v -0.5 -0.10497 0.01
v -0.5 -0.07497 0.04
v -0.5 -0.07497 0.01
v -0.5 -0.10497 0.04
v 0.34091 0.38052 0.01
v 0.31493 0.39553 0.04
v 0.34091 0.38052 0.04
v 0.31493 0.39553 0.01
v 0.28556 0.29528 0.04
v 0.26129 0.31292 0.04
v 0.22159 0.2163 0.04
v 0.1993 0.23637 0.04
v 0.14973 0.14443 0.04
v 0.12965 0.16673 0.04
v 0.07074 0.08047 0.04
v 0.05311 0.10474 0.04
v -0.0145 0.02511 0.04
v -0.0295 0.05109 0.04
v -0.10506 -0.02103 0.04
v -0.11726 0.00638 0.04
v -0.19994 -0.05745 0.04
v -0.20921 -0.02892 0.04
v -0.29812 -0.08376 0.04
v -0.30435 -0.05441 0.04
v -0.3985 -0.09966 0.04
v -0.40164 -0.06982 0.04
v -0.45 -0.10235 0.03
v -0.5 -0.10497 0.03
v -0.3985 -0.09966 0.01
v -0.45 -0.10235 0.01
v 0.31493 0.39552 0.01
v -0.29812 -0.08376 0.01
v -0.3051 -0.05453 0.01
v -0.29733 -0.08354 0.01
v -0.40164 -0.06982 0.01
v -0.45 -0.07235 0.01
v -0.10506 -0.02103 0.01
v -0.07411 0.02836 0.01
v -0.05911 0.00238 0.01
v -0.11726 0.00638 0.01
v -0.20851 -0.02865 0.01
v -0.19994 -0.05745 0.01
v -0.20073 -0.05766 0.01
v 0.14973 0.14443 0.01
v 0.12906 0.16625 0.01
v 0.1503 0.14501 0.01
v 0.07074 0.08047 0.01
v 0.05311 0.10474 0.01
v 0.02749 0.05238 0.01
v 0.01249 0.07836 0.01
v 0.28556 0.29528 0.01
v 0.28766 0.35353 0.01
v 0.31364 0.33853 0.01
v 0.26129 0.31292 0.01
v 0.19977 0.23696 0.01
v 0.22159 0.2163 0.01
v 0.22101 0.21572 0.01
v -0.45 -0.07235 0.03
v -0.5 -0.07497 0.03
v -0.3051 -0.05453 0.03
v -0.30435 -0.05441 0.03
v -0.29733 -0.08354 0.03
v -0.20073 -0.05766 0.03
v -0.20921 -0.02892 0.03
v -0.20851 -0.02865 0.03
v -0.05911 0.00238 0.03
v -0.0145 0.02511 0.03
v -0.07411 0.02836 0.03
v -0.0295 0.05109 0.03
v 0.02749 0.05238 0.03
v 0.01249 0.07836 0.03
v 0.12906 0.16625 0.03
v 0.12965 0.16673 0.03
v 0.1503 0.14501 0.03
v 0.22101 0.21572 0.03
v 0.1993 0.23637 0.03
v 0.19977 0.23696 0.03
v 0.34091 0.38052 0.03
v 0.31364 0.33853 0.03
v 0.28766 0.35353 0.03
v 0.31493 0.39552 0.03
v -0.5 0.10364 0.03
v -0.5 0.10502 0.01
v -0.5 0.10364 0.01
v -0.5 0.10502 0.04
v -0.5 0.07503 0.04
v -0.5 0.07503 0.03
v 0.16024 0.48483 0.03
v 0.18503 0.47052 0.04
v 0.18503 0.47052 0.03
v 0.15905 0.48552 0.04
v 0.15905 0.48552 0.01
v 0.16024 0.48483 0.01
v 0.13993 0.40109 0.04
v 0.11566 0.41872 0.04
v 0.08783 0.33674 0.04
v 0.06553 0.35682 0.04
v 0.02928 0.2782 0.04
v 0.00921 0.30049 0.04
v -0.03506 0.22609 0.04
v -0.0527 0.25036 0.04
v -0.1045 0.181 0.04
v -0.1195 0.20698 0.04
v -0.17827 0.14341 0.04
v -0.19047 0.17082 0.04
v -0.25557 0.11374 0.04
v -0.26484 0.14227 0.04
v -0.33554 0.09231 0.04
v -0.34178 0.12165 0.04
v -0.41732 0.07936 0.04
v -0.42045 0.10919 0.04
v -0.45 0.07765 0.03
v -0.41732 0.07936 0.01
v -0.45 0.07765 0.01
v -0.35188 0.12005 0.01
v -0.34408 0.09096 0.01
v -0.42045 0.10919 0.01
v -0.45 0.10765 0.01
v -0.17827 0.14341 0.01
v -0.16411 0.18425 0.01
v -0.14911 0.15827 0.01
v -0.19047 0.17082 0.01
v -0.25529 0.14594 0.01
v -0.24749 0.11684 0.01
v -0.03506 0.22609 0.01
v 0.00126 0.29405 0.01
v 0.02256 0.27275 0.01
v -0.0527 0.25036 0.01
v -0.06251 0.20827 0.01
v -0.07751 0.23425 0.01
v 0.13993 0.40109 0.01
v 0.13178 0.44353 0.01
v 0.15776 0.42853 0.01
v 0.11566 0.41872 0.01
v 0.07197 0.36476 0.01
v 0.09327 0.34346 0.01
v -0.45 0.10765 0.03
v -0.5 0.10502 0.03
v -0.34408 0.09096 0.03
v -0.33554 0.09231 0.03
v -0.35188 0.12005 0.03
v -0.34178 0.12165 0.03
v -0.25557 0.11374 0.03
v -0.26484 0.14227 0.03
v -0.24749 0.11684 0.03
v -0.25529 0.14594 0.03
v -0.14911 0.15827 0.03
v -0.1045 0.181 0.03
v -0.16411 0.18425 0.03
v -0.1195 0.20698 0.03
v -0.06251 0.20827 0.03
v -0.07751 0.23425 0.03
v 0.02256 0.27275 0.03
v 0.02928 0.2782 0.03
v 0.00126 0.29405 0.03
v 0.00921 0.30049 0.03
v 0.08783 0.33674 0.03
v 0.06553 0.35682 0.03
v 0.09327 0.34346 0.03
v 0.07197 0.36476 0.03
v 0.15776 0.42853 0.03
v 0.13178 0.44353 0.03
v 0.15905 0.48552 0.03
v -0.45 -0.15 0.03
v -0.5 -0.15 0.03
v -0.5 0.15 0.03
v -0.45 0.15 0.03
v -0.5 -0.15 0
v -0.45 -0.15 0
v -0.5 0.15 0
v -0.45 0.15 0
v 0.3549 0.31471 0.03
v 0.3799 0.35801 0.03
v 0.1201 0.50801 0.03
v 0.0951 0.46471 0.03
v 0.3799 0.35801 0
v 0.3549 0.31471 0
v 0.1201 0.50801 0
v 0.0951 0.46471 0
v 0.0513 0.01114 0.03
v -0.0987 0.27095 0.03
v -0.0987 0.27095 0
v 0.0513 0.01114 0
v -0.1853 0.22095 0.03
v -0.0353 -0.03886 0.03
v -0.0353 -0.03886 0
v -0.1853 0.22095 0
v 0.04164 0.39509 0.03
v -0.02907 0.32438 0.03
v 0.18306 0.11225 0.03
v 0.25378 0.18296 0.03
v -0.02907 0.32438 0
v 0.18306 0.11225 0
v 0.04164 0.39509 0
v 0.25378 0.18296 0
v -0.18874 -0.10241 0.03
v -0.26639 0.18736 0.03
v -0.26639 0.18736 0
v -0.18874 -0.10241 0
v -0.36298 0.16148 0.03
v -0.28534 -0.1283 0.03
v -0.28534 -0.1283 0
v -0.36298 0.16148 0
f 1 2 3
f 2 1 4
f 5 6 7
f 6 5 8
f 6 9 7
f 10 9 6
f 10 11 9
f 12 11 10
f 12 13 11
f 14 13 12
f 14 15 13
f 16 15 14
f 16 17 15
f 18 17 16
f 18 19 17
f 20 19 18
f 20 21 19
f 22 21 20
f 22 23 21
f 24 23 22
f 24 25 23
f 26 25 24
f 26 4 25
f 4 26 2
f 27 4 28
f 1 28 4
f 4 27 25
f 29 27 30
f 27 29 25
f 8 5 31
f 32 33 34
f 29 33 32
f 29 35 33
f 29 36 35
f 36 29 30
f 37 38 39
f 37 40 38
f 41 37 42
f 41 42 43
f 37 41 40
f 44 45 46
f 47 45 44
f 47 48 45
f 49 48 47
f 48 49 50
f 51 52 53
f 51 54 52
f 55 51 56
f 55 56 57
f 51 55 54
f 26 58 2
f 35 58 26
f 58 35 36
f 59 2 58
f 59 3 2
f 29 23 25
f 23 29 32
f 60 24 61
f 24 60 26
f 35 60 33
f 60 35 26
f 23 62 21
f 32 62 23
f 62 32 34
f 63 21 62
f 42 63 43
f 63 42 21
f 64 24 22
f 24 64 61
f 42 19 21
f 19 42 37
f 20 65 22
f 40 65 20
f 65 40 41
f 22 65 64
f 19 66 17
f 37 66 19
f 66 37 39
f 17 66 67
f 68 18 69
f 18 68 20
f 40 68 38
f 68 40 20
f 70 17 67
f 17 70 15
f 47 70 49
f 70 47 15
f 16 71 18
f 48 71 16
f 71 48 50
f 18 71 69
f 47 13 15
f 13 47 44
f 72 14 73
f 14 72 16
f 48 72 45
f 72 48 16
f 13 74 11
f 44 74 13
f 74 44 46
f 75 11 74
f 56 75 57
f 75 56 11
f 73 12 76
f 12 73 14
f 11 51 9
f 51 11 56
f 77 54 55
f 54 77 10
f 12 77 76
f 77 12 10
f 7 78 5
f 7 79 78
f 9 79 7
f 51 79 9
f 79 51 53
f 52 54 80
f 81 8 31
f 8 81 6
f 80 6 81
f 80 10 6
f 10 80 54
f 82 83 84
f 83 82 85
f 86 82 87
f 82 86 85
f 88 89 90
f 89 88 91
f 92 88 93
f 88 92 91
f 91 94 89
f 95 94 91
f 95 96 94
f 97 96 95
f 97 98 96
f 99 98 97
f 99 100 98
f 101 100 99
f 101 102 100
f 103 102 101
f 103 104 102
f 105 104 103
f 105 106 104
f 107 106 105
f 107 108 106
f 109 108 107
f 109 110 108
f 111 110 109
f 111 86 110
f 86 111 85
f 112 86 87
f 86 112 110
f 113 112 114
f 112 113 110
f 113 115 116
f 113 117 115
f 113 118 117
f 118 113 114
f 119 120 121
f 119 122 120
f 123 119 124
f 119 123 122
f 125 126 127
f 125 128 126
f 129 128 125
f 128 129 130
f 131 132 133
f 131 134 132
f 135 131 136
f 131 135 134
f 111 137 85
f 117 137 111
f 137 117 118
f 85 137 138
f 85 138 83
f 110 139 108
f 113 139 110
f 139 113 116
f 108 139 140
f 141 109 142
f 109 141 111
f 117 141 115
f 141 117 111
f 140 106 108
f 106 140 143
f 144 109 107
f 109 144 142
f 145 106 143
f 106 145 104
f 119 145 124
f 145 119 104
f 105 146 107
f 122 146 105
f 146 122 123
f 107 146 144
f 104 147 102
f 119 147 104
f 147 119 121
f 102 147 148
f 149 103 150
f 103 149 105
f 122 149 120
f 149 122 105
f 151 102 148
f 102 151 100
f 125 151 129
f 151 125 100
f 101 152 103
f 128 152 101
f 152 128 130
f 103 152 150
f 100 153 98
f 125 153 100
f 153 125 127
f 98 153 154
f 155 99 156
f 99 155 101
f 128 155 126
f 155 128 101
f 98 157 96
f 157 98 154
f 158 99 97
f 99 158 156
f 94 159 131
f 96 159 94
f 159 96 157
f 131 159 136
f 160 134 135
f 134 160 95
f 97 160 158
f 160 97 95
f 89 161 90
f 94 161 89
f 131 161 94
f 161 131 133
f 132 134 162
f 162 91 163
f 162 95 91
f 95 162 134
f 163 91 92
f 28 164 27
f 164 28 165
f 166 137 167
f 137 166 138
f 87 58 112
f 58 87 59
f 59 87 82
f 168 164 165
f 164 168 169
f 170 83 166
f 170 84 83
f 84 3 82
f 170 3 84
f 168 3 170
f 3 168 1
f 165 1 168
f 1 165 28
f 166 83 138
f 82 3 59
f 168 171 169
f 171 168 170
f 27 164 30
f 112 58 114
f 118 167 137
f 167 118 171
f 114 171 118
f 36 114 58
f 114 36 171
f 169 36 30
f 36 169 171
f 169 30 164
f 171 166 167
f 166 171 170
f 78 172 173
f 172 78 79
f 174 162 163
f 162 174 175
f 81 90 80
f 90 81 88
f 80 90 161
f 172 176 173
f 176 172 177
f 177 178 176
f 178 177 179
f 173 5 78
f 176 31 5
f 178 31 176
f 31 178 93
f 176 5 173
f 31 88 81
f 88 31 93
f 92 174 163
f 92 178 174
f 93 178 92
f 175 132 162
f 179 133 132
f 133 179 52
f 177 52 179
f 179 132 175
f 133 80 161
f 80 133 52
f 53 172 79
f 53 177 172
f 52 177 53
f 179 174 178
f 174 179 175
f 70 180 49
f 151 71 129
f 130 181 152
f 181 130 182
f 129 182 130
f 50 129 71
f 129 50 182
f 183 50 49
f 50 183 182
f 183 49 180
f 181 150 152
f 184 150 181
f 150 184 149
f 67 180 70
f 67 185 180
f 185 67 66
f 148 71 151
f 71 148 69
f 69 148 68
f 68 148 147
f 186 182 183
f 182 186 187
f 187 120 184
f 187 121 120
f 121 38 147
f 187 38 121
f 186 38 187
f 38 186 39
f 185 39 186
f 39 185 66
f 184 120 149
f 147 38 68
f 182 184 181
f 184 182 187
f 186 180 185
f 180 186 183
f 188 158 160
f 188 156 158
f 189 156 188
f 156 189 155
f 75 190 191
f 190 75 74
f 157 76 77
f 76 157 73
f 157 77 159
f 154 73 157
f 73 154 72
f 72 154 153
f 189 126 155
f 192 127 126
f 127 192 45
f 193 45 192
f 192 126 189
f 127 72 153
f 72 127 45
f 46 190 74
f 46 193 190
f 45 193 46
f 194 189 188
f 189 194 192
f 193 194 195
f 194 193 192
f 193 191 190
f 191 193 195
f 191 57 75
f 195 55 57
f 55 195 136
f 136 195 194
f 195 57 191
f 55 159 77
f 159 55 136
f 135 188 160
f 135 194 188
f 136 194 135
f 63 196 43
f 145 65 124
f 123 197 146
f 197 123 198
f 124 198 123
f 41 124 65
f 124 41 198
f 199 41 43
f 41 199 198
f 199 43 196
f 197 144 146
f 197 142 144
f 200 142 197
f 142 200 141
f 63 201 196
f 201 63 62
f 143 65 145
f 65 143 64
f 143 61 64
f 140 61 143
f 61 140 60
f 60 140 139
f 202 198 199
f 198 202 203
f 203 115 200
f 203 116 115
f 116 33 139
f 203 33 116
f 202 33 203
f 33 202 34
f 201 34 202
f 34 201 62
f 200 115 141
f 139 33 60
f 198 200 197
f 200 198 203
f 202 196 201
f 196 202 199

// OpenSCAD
// mirror([0, 0, 1]) import("grass.stl");

//////////////
// STRAIGHT //
//////////////

// // tracks
// translate([ .09, 0, .025]) cube([.03, 1, .03], true);
// translate([-.09, 0, .025]) cube([.03, 1, .03], true);

// // ends
// translate([0, .475, .015]) cube([.3, .05, .03], true);
// translate([0,-.475, .015]) cube([.3, .05, .03], true);

// // beats
// translate([0, .25, .015]) cube([.3, .1, .03], true);
// translate([0,-.25, .015]) cube([.3, .1, .03], true);
// translate([0, 0, .015]) cube([.3, .1, .03], true);

////////////
// CURVED //
////////////

$fn = 64;

rotate([0, 0, 30]) {

    // tracks
    translate([0, 1, .025])
    rotate([0, 0, -120]) rotate_extrude(angle=60)
    translate([.956, 0, 0]) square([.03, .03], true);
    translate([0, 1, .025])
    rotate([0, 0, -120]) rotate_extrude(angle=60)
    translate([.776, 0, 0]) square([.03, .03], true);

    // ends
    rotate([0, 0, 60])
    translate([0, .475, .015]) cube([.3, .05, .03], true);
    rotate([0, 0, 120])
    translate([0,-.475, .015]) cube([.3, .05, .03], true);

    // beats
    translate([0, 1, 0]) rotate([0, 0, 0])
    translate([0, -.866, .015]) cube([.1, .3, .03], true);
    translate([0, 1, 0]) rotate([0, 0, 15])
    translate([0, -.866, .015]) cube([.1, .3, .03], true);
    translate([0, 1, 0]) rotate([0, 0,-15])
    translate([0, -.866, .015]) cube([.1, .3, .03], true);

}
